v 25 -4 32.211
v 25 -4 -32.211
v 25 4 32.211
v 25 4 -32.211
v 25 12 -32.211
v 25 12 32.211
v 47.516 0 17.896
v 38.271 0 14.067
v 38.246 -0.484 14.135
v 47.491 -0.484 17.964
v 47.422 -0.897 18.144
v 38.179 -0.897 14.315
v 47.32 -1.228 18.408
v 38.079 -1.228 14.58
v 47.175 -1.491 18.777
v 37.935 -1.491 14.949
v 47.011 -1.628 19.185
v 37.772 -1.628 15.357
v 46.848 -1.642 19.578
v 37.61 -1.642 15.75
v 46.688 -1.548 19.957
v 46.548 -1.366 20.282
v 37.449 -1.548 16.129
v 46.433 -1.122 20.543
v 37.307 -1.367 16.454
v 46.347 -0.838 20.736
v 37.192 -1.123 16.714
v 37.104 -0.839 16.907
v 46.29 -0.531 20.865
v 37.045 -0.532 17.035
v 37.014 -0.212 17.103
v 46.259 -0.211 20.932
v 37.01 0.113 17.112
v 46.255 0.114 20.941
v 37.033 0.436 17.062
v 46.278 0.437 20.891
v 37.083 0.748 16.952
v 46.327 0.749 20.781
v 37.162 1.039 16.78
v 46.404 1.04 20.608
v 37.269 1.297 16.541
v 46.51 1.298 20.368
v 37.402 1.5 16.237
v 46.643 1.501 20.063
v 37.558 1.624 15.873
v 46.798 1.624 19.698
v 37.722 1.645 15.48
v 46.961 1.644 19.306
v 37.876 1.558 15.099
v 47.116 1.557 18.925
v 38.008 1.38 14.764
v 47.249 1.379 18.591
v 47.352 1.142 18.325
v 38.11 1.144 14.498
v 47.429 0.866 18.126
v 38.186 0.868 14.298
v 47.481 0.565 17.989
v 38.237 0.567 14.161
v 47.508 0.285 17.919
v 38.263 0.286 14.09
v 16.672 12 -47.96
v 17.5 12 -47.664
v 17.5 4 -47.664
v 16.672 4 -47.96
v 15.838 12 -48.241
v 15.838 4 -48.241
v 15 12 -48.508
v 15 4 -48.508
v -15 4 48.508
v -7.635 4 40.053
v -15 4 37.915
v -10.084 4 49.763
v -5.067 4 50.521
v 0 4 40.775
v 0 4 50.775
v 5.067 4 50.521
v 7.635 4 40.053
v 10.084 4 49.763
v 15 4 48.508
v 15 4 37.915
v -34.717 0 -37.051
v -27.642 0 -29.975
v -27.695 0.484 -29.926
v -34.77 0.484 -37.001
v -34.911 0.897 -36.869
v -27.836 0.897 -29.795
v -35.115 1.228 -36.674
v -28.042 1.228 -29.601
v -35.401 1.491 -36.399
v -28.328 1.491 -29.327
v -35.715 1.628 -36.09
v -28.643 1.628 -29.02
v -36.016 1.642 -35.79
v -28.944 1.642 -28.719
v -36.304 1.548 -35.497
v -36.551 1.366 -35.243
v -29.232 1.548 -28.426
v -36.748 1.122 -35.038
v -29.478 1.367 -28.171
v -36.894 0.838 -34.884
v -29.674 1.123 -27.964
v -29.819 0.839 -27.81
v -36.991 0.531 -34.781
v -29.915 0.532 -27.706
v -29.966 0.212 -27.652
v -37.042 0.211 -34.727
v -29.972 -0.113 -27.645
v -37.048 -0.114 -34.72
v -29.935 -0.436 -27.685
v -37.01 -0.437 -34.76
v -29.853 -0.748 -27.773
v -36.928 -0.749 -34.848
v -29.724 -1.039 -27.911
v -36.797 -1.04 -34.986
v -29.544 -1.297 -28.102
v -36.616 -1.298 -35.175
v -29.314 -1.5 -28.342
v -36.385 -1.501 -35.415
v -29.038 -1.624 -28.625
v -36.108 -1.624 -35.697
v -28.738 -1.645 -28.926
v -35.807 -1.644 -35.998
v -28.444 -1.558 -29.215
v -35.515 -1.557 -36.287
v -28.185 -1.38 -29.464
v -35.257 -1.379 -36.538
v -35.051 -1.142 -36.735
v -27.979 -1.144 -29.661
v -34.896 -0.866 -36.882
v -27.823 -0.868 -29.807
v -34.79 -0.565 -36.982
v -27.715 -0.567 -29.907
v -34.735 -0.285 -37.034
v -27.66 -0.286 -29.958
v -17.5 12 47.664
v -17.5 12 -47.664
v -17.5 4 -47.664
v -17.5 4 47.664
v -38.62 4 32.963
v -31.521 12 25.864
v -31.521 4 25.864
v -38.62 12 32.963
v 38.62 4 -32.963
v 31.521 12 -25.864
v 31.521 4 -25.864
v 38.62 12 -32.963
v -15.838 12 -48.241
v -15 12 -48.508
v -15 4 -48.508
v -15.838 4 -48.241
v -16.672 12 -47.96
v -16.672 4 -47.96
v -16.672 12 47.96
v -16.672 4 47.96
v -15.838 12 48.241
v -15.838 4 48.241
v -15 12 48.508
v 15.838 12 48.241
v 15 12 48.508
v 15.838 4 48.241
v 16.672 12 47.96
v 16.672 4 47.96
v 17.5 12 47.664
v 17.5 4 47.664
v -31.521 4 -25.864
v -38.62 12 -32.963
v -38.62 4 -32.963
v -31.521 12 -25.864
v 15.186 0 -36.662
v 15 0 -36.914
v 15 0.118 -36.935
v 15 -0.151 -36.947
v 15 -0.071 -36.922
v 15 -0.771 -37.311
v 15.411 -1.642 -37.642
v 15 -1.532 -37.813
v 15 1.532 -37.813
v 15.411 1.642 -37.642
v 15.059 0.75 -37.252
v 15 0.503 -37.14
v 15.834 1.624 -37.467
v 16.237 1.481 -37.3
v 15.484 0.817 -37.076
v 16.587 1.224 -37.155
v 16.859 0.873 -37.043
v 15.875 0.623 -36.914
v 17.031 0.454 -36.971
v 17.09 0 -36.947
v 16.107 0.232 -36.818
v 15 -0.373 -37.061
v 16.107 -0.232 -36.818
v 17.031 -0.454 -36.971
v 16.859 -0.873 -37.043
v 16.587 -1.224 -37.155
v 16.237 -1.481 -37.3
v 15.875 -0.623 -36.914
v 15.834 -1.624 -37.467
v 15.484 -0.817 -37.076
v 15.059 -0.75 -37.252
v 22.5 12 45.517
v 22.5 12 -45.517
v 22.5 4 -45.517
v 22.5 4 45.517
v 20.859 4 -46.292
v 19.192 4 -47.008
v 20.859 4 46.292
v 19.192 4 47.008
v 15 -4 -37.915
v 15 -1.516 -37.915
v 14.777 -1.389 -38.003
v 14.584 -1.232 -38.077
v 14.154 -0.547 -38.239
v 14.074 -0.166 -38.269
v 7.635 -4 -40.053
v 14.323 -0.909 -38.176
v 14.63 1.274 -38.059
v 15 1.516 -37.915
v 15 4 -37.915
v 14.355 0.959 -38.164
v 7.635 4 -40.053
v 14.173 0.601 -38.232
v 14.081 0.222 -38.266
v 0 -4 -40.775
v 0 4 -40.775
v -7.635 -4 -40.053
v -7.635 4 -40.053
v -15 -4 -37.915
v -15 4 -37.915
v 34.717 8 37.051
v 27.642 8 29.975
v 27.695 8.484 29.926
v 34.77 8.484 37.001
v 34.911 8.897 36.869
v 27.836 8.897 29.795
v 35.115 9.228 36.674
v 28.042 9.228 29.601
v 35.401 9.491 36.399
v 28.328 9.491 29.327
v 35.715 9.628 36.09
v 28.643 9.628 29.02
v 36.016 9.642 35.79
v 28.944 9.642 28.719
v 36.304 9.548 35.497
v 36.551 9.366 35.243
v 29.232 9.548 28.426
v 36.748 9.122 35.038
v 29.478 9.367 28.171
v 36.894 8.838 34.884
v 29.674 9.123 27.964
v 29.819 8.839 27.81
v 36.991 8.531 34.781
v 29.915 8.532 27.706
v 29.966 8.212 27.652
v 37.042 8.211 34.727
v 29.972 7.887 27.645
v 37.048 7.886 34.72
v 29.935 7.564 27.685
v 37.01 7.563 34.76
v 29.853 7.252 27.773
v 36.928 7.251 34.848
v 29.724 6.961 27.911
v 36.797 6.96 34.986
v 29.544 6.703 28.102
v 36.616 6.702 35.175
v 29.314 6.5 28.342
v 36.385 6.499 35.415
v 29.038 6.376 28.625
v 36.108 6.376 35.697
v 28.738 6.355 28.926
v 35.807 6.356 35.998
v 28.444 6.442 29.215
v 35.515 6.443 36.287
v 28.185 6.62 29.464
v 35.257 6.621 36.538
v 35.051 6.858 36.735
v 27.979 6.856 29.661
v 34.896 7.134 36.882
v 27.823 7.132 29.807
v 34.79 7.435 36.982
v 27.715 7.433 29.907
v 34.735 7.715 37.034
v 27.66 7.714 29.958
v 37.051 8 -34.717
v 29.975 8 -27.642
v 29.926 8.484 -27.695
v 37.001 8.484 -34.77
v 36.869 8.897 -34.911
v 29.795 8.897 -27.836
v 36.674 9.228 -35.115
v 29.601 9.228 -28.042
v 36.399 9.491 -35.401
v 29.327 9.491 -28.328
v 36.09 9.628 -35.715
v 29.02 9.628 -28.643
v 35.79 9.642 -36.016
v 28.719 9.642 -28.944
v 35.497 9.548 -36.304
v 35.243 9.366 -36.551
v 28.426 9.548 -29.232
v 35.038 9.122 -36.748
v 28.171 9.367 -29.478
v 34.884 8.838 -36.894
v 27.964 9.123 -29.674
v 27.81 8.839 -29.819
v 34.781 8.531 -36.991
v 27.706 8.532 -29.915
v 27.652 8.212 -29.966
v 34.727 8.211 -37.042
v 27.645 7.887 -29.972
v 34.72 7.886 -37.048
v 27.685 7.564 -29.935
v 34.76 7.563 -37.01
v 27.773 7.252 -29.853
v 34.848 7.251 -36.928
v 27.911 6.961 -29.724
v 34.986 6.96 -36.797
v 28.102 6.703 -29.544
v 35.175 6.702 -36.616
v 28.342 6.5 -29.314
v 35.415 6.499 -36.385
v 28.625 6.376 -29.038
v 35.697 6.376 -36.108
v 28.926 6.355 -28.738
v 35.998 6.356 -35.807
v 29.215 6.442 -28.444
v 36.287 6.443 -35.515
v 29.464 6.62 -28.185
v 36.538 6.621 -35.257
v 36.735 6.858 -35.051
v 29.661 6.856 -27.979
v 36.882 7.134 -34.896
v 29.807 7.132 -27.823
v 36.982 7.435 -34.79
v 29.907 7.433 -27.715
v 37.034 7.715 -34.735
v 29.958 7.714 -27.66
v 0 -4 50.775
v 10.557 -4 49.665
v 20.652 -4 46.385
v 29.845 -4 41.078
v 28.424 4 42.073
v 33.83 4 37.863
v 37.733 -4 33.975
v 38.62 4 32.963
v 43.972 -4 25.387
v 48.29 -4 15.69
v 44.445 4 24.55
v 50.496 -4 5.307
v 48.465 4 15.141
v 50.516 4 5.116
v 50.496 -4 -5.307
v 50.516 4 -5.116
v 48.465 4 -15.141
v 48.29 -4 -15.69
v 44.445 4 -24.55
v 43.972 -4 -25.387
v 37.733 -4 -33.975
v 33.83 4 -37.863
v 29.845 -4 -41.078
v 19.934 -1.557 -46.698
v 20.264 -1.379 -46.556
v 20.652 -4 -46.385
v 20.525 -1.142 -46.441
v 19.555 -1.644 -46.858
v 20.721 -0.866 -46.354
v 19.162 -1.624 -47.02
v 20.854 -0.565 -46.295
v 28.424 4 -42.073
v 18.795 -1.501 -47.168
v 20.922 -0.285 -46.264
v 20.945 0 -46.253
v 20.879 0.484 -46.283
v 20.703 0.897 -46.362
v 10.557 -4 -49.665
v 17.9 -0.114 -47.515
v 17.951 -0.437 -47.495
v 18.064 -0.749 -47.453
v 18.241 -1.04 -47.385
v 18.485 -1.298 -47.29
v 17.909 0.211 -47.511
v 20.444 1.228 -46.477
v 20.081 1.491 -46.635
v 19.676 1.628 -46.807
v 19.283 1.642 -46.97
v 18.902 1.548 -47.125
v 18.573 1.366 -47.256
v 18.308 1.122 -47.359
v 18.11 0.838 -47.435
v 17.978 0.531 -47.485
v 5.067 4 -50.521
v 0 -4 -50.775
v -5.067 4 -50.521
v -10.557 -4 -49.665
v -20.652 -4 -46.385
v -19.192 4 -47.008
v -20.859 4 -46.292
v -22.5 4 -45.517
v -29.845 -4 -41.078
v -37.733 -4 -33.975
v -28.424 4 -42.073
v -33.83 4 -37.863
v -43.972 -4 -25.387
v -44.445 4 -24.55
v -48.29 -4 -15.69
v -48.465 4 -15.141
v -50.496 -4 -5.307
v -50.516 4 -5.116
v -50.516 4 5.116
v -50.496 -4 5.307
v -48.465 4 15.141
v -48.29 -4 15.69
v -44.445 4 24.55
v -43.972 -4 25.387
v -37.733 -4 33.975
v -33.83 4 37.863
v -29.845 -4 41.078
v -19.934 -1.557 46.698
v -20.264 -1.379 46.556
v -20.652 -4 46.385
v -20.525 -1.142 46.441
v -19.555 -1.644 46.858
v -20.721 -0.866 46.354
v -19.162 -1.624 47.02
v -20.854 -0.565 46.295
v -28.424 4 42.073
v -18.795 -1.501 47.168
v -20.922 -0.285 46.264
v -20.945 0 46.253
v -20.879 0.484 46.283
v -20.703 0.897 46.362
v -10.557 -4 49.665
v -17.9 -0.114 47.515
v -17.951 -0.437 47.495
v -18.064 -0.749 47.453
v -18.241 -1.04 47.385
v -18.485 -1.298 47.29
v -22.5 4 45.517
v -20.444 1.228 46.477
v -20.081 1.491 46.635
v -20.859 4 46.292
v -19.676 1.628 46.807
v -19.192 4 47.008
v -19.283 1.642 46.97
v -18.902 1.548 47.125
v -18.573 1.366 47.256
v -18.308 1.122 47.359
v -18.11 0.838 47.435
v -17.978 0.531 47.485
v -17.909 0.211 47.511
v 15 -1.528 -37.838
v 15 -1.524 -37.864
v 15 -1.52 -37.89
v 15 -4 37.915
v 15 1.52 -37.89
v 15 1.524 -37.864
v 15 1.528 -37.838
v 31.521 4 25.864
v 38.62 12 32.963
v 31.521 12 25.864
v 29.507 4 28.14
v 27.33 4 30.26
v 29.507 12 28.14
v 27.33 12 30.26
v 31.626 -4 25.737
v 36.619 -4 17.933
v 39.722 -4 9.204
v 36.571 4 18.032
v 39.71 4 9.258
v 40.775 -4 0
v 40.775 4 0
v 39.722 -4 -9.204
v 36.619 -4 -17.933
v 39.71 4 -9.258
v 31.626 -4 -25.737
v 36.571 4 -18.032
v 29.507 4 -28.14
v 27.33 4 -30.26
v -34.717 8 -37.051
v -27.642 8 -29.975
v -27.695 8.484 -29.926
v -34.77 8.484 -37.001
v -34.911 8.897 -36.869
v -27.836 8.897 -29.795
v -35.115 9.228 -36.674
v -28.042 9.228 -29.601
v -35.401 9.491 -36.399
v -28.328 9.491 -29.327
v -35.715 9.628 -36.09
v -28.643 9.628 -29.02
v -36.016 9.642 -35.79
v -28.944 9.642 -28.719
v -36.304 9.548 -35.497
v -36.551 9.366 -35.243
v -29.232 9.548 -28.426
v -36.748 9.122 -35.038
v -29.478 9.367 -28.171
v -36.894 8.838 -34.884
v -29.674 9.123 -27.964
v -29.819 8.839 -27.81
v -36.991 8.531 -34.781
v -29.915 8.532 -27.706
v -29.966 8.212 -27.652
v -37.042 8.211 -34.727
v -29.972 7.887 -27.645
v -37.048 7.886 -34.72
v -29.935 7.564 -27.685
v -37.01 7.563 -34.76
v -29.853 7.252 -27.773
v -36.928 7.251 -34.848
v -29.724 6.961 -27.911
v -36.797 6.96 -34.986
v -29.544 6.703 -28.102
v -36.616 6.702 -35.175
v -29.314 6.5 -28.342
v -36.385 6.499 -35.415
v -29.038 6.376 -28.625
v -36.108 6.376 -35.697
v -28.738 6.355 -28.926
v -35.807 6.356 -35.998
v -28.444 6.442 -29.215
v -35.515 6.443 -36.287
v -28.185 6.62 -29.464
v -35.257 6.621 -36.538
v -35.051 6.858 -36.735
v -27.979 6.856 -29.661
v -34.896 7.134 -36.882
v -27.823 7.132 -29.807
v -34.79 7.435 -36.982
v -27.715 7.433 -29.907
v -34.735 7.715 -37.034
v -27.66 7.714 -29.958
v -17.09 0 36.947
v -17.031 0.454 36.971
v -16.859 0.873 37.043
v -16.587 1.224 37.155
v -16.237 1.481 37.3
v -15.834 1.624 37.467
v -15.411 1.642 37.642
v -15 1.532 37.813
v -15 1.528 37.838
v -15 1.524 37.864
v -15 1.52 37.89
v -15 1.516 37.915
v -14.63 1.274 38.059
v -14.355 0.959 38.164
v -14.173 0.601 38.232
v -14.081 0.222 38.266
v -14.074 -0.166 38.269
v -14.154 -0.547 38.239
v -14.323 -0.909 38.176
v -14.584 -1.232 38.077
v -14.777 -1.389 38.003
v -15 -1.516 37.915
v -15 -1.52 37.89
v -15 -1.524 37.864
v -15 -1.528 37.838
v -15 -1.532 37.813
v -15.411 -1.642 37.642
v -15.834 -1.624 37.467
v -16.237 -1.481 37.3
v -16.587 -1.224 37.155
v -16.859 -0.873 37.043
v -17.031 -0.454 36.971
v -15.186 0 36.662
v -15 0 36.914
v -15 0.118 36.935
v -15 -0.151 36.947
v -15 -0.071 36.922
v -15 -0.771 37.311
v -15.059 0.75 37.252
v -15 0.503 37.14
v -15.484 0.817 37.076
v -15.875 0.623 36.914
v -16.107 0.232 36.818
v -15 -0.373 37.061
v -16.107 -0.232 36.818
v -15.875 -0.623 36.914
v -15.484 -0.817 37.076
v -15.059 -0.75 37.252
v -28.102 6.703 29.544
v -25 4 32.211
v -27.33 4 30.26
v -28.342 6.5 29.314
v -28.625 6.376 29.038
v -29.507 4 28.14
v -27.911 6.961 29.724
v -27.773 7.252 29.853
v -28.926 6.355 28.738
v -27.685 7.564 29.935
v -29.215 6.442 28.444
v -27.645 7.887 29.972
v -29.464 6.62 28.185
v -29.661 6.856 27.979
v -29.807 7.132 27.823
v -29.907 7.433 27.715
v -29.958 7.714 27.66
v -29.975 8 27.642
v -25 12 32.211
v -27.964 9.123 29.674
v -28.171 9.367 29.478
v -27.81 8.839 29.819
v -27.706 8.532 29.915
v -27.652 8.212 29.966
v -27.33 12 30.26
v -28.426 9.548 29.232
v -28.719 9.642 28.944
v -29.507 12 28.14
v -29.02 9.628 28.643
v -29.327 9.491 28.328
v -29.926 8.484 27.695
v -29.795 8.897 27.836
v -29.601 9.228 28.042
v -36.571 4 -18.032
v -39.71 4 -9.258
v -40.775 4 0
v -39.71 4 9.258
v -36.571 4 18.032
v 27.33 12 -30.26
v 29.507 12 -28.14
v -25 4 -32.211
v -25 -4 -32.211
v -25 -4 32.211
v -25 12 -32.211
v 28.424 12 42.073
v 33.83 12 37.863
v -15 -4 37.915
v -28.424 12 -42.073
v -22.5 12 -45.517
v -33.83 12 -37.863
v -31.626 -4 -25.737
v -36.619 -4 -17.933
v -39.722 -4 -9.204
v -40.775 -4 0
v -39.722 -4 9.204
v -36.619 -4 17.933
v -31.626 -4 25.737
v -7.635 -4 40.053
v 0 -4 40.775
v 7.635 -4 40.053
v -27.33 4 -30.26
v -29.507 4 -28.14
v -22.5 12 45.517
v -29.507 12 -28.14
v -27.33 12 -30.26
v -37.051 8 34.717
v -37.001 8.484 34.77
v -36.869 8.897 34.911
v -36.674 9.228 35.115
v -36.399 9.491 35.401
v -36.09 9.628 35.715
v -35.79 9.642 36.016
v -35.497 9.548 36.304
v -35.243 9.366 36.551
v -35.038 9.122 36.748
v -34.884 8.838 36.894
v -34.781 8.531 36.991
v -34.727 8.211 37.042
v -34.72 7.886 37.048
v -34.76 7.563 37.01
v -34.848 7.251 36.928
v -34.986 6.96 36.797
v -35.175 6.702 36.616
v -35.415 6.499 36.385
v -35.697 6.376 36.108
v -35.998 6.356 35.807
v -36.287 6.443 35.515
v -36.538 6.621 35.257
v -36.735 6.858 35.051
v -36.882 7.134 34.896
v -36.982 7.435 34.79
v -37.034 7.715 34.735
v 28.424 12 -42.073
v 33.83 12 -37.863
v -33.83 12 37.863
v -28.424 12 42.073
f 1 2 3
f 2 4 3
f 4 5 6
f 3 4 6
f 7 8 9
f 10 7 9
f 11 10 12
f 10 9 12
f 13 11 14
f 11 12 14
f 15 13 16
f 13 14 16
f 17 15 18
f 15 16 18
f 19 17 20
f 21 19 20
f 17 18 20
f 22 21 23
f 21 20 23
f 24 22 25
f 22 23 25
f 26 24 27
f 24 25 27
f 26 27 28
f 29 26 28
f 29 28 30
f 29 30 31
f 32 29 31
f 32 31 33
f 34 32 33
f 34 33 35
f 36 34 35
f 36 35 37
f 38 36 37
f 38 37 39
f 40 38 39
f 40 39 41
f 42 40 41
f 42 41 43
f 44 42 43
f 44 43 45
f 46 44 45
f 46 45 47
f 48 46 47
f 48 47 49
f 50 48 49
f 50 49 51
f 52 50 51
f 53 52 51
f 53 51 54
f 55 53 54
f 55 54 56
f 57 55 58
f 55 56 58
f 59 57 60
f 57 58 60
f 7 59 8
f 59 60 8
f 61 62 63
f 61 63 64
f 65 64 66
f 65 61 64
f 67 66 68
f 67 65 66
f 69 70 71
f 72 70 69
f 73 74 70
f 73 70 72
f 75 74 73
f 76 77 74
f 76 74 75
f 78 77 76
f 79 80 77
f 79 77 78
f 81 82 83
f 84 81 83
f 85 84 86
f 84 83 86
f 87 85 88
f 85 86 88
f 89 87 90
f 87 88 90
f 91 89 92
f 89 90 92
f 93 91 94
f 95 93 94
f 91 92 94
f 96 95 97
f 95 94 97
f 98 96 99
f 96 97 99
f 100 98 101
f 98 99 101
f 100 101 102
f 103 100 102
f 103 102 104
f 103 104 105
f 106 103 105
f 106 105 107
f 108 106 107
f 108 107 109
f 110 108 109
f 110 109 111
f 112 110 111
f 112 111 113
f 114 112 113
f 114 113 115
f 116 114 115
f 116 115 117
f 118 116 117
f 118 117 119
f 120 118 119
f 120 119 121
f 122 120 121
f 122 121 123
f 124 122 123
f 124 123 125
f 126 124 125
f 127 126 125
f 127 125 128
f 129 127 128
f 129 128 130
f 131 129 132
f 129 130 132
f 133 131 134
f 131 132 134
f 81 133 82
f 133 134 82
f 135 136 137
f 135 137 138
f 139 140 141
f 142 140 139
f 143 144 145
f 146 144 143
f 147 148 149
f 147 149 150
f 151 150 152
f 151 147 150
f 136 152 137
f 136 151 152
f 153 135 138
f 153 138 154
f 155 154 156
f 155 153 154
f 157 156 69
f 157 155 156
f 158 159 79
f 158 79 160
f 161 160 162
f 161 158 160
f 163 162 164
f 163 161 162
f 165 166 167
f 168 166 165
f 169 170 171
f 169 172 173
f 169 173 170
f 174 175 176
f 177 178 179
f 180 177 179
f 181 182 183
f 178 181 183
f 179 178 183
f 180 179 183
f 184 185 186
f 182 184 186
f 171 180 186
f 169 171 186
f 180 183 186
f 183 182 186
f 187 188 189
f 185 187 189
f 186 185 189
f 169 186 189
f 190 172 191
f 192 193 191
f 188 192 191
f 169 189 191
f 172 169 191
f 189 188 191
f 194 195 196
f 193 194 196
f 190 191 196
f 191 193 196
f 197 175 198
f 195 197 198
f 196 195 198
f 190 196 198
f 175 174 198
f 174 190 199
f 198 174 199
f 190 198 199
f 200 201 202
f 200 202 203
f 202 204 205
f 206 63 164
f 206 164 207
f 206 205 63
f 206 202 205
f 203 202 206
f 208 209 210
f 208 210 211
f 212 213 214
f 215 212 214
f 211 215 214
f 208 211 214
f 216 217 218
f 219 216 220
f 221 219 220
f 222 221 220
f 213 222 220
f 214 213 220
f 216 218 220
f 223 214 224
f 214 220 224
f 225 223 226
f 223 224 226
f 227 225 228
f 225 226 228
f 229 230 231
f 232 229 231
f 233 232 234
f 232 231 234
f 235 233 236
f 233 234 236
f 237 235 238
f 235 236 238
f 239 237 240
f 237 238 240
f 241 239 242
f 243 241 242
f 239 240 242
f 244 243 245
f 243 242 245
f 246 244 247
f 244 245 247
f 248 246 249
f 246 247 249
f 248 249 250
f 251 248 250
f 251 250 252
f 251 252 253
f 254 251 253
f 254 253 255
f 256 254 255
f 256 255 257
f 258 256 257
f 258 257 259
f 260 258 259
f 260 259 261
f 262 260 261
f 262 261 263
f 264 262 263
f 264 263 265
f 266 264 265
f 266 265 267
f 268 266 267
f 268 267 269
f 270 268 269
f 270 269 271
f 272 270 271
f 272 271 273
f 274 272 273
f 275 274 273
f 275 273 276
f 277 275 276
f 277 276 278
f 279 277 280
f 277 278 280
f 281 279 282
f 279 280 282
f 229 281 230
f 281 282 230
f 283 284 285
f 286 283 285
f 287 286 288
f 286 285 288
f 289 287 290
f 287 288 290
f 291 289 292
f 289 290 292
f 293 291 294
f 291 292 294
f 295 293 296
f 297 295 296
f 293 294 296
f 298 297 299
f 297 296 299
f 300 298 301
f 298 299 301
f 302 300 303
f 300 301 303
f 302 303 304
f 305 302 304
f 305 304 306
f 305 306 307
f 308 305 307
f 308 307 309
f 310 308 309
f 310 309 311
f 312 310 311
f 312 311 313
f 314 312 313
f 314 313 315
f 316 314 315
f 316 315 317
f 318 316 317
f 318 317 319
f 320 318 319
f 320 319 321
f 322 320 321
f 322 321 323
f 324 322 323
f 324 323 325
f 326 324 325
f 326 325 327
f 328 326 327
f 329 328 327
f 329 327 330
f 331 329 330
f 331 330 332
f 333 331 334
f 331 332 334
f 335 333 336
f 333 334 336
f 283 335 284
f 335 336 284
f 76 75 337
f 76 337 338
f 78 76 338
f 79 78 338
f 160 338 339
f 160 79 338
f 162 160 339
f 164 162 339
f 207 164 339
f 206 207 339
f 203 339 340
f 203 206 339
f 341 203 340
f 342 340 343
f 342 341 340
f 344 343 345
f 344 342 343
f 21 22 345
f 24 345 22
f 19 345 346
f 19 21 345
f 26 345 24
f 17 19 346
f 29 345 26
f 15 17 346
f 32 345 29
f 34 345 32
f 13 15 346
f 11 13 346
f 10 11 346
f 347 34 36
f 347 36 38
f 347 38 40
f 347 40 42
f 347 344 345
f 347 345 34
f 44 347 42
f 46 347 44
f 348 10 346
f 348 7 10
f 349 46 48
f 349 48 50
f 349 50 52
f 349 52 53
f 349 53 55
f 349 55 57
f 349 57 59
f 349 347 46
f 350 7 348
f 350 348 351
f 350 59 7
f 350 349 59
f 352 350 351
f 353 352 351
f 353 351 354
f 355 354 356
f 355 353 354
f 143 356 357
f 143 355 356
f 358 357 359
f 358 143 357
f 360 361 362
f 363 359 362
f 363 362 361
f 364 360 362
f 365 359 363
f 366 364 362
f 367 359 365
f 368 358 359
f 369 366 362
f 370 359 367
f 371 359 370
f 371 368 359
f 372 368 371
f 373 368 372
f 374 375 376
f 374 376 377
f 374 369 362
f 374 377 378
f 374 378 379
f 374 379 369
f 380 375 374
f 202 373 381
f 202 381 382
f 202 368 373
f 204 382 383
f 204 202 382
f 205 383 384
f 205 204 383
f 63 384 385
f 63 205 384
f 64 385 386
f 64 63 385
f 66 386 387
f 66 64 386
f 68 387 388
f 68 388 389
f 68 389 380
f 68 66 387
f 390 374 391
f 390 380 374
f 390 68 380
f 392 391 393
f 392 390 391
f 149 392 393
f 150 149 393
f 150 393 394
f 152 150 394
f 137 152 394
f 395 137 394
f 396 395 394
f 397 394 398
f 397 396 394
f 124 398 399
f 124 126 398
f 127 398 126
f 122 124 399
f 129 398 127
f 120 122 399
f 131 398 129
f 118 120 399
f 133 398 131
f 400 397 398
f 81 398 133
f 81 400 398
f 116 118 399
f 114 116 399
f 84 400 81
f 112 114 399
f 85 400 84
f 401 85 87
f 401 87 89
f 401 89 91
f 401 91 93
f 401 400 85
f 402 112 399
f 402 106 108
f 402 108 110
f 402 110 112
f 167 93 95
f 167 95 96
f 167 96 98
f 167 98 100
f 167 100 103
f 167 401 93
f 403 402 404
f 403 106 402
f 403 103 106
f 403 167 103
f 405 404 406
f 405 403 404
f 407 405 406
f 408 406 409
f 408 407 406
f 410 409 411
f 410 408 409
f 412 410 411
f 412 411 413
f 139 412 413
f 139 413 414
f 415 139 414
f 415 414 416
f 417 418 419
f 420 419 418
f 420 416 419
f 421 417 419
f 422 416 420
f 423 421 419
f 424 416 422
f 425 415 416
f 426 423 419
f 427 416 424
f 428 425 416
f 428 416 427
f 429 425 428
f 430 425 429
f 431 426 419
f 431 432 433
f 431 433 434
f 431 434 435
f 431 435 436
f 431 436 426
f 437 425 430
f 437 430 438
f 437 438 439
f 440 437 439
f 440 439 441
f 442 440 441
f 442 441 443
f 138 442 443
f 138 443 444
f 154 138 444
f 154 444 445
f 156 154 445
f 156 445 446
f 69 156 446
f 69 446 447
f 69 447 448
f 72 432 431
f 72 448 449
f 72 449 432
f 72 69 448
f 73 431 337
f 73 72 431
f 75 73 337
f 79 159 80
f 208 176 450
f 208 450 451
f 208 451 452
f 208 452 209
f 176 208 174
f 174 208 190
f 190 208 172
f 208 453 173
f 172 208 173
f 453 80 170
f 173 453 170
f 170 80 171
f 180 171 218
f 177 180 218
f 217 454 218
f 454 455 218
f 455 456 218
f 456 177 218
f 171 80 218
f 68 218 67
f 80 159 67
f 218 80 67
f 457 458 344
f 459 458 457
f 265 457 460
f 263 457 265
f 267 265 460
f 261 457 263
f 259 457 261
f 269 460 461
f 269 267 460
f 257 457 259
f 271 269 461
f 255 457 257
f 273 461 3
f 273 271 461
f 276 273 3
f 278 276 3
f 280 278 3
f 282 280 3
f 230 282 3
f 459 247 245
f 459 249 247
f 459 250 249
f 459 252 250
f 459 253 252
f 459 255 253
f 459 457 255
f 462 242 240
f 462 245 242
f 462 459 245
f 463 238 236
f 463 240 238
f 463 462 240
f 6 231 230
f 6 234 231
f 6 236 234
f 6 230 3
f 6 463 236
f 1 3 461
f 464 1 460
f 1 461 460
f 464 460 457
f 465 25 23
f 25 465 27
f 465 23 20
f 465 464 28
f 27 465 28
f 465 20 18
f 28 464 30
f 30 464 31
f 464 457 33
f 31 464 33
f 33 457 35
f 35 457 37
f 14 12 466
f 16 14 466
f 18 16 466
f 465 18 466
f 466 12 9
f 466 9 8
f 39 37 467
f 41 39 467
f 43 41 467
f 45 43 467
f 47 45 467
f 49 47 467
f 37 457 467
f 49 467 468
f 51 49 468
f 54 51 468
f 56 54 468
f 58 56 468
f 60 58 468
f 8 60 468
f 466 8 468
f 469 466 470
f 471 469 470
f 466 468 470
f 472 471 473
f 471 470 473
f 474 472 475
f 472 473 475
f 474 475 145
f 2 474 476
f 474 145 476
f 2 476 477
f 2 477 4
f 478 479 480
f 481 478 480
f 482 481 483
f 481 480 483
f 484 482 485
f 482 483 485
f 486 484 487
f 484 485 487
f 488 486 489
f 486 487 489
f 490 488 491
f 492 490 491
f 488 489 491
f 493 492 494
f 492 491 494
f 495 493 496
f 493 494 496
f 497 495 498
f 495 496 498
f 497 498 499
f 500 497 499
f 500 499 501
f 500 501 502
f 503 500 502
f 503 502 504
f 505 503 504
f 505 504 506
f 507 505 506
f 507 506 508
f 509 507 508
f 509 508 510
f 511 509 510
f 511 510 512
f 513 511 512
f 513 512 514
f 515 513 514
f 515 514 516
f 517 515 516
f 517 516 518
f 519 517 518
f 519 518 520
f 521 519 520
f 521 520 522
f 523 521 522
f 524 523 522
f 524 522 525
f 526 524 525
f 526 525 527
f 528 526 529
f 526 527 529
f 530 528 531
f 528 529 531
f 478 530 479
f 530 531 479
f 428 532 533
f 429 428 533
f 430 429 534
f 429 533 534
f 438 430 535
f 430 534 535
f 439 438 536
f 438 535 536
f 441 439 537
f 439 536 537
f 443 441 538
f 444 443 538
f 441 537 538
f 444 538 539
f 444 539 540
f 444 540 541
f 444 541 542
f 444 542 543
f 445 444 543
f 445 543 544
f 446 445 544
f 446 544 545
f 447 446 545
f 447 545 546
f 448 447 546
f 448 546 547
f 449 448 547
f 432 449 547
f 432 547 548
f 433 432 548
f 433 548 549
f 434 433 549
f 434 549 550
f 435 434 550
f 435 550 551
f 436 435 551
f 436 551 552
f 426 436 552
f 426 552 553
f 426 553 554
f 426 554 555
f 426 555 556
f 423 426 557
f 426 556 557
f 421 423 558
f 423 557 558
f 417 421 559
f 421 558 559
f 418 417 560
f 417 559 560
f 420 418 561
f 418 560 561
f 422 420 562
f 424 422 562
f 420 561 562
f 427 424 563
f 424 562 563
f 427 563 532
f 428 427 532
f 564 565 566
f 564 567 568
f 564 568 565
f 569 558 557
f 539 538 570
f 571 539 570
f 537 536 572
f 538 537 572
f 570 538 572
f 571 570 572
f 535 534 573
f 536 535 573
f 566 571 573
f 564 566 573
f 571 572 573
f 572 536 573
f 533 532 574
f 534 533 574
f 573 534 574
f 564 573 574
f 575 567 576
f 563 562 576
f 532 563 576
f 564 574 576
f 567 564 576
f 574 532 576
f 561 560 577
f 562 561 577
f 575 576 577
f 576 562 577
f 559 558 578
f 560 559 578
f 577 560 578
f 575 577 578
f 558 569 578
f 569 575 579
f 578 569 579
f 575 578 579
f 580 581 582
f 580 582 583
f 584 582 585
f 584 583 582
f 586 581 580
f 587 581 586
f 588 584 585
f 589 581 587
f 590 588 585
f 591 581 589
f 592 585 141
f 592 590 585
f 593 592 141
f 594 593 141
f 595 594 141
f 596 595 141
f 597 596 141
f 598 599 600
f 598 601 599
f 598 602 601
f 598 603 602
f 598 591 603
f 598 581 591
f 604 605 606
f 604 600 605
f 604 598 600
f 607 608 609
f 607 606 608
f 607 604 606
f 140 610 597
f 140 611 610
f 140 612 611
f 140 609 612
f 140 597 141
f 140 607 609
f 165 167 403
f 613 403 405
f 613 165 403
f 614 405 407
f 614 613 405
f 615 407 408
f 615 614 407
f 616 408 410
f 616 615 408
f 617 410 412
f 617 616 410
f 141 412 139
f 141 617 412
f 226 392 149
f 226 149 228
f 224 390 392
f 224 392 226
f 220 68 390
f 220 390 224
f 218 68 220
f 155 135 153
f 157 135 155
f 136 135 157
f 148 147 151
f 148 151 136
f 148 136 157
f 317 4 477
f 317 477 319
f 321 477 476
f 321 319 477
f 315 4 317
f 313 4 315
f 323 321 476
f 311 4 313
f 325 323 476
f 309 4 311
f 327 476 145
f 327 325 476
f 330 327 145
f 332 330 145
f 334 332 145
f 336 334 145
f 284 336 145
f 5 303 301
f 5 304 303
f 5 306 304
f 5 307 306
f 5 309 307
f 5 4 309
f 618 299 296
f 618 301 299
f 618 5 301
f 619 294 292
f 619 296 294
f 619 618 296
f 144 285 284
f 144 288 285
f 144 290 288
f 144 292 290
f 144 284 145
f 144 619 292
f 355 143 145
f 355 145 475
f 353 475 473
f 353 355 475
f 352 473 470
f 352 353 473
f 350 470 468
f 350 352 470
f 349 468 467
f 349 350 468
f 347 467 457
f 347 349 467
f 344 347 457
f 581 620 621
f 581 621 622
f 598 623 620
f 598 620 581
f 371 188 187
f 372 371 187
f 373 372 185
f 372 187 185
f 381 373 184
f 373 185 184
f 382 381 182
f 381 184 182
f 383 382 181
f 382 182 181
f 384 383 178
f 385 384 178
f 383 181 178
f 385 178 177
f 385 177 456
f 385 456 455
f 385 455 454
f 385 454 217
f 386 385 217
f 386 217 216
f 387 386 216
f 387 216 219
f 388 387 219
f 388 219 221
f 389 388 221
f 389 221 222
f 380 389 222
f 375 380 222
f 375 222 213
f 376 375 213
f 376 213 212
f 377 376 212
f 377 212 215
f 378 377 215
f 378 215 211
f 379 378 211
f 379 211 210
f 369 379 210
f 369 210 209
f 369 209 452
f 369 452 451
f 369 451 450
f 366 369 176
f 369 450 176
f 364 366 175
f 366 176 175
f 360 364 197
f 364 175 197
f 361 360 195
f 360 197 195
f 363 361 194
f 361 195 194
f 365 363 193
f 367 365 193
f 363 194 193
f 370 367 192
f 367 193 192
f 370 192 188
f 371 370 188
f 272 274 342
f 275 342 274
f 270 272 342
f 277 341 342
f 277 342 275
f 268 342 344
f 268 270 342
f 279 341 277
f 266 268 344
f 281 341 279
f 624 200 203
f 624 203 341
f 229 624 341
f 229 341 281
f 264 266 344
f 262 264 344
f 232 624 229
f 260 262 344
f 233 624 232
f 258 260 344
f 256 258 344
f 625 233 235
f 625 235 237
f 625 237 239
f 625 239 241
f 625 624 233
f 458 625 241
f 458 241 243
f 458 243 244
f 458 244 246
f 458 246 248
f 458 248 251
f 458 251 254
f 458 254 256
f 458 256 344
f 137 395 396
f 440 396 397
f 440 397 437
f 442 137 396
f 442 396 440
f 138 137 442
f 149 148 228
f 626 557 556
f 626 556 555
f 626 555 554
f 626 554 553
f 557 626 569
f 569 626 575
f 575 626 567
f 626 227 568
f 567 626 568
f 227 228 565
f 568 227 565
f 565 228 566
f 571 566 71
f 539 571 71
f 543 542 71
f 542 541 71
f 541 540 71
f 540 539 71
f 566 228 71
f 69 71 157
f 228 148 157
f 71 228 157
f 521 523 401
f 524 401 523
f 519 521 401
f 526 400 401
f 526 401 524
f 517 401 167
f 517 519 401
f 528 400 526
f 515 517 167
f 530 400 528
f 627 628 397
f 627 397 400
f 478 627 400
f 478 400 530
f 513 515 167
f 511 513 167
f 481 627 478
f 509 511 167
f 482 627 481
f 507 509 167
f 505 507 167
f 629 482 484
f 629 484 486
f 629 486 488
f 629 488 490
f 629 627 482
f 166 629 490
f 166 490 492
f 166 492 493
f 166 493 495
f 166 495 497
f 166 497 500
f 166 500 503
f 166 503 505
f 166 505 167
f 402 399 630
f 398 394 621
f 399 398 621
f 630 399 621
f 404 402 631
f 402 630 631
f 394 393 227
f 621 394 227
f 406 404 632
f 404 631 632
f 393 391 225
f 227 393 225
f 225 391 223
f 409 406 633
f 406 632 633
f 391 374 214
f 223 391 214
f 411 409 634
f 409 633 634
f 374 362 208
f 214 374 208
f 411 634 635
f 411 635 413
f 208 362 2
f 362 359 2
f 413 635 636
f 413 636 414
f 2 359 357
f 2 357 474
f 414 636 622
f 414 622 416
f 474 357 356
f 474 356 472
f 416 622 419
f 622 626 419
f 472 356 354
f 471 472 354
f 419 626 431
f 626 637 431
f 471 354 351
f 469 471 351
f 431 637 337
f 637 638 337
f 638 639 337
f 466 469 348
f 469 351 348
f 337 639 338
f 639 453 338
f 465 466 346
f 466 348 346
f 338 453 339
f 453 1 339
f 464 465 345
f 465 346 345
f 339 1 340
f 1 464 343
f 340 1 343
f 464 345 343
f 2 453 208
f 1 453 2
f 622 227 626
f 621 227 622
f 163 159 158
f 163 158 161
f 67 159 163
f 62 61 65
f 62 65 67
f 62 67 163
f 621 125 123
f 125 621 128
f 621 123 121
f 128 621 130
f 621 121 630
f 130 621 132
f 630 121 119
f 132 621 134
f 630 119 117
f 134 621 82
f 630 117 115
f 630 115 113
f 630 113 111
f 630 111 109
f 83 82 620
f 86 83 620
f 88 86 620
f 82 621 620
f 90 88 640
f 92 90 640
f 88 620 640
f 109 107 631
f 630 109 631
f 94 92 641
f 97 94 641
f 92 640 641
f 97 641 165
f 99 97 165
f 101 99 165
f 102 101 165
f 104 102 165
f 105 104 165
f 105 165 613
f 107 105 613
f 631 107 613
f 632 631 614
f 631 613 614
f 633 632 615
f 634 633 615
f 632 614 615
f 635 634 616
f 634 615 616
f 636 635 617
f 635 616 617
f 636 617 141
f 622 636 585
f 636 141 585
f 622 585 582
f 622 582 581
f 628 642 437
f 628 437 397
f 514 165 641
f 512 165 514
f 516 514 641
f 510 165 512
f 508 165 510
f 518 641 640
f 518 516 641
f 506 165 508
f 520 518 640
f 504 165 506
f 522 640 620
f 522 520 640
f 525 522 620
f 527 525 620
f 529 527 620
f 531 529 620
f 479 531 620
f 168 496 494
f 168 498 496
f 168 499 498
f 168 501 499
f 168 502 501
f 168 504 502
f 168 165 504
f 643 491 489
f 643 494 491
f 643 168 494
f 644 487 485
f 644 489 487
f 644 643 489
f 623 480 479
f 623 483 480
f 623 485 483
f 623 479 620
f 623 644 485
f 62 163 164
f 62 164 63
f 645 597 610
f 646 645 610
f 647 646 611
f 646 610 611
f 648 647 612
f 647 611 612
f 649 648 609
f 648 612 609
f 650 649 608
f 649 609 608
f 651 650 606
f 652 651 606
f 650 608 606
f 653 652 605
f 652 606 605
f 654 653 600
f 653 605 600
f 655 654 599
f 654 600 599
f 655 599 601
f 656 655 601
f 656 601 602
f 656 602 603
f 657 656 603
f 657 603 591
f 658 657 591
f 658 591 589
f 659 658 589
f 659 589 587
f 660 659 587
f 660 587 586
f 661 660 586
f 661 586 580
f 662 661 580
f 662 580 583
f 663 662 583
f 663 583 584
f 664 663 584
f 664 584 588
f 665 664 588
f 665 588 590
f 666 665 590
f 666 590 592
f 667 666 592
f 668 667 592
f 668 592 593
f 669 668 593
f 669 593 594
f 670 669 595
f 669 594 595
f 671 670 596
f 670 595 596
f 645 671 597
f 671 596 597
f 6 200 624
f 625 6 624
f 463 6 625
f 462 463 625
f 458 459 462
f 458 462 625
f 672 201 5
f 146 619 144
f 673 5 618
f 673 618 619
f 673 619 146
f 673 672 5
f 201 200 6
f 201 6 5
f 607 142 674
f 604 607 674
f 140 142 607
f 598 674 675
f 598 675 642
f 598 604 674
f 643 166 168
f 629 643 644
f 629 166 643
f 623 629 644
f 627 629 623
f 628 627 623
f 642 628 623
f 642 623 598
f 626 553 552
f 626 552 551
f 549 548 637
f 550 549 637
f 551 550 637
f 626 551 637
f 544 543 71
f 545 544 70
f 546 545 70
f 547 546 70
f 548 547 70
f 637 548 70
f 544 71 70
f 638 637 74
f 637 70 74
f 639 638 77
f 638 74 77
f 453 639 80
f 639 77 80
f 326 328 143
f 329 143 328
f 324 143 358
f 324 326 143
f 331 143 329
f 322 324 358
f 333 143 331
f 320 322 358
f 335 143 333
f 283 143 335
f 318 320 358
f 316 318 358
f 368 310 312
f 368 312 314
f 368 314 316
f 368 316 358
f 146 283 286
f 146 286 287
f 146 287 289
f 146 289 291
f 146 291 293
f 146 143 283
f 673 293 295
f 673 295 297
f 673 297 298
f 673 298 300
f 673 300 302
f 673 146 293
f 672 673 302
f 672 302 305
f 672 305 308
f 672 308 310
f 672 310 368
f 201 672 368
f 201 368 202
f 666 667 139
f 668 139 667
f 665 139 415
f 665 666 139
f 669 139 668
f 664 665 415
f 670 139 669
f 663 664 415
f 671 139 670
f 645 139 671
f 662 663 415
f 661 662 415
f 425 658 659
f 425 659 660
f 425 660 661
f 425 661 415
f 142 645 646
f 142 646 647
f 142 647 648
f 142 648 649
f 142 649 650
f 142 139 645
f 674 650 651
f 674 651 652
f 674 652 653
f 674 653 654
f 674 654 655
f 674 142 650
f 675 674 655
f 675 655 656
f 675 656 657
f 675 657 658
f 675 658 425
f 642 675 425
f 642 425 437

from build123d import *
from build123d.topology import SkipClean

# Parameters (mm, degrees)
SKETCH1_R                       = 50.7746
BOSS_EXTRUDE1_DEPTH             = 4
BOSS_EXTRUDE2_START             = 8
BOSS_EXTRUDE2_DEPTH             = 8
M4_TAPPED_HOLE1_D               = 3.3
M4_TAPPED_HOLE1_DEPTH           = 10.1
M4_TAPPED_HOLE1_TIP             = 0.991420021
M4_TAPPED_HOLE1_ON_FACE_2_D     = 3.3
M4_TAPPED_HOLE1_ON_FACE_2_DEPTH = 10.1
M4_TAPPED_HOLE1_ON_FACE_2_TIP   = 0.991420021
M4_TAPPED_HOLE1_ON_FACE_3_D     = 3.3
M4_TAPPED_HOLE1_ON_FACE_3_DEPTH = 10.1
M4_TAPPED_HOLE1_ON_FACE_3_TIP   = 0.991420021
M4_TAPPED_HOLE1_ON_FACE_4_D     = 3.3
M4_TAPPED_HOLE1_ON_FACE_4_DEPTH = 10.1
M4_TAPPED_HOLE1_ON_FACE_4_TIP   = 0.991420021
M4_TAPPED_HOLE1_ON_FACE_5_D     = 3.3
M4_TAPPED_HOLE1_ON_FACE_5_DEPTH = 10.1
M4_TAPPED_HOLE1_ON_FACE_5_TIP   = 0.991420021
M4_TAPPED_HOLE1_ON_FACE_6_D     = 3.3
M4_TAPPED_HOLE1_ON_FACE_6_DEPTH = 10.1
M4_TAPPED_HOLE1_ON_FACE_6_TIP   = 0.991420021
M4_TAPPED_HOLE1_ON_FACE_7_D     = 3.3
M4_TAPPED_HOLE1_ON_FACE_7_DEPTH = 10.1
M4_TAPPED_HOLE1_ON_FACE_7_TIP   = 0.991420021
M4_TAPPED_HOLE1_ON_FACE_8_D     = 3.3
M4_TAPPED_HOLE1_ON_FACE_8_DEPTH = 10.1
M4_TAPPED_HOLE1_ON_FACE_8_TIP   = 0.991420021


with BuildPart() as part:
    # Sketch1 → Boss-Extrude1 (new, symmetric)
    with BuildSketch(Plane(origin=(0, 0, 0), x_dir=(1, 0, 0), z_dir=(0, 1, 0))):
        with Locations(Location((0, 0, 0), (0, 0, 270))):
            Circle(SKETCH1_R)
        with BuildLine():
            ThreePointArc((15, 37.915274035), (0, 40.7746), (-15, 37.915274035))
            Line((-15, 37.915274035), (-15, -37.915274035))
            ThreePointArc((-15, -37.915274035), (0, -40.7746), (15, -37.915274035))
            Line((15, -37.915274035), (15, 37.915274035))
        make_face(mode=Mode.SUBTRACT)
        with BuildLine():
            ThreePointArc((25, -32.211302444), (40.7746, 0), (25, 32.211302444))
            Line((25, 32.211302444), (25, -32.211302444))
        make_face(mode=Mode.SUBTRACT)
        with BuildLine():
            ThreePointArc((-25, 32.211302444), (-40.7746, 0), (-25, -32.211302444))
            Line((-25, -32.211302444), (-25, 32.211302444))
        make_face(mode=Mode.SUBTRACT)
    extrude(amount=BOSS_EXTRUDE1_DEPTH, both=True)

    # Sketch2 → Boss-Extrude2 (add)
    with SkipClean():  # the faces are left unmerged after this step: merging them gives an invalid solid
        with BuildSketch(Plane(origin=(0, 4, 0), x_dir=(1, 0, 0), z_dir=(0, 1, 0)).offset(BOSS_EXTRUDE2_START)):
            with BuildLine():
                Line((-22.5, -45.517139686), (-22.5, 45.517139686))
                ThreePointArc((-22.5, 45.517139686), (-31.197949015, 40.059305815), (-38.619906594, 32.963052344))
                Line((-38.619906594, 32.963052344), (-31.521353127, 25.864498878))
                ThreePointArc((-31.521353127, 25.864498878), (-28.438289659, 29.220398465), (-25, 32.211302444))
                Line((-25, 32.211302444), (-25, -32.211302444))
                ThreePointArc((-25, -32.211302444), (-28.438289659, -29.220398465), (-31.521353127, -25.864498878))
                Line((-31.521353127, -25.864498878), (-38.619906594, -32.963052344))
                ThreePointArc((-38.619906594, -32.963052344), (-31.197949015, -40.059305815), (-22.5, -45.517139686))
            make_face()
            with BuildLine():
                ThreePointArc((-15, 48.50834985), (-16.255489516, 48.102173192), (-17.5, 47.663508108))
                Line((-17.5, 47.663508108), (-17.5, -47.663508108))
                ThreePointArc((-17.5, -47.663508108), (-16.255489516, -48.102173192), (-15, -48.50834985))
                Line((-15, -48.50834985), (-15, 48.50834985))
            make_face()
            with BuildLine():
                ThreePointArc((17.5, 47.663508108), (16.255489516, 48.102173192), (15, 48.50834985))
                Line((15, 48.50834985), (15, -48.50834985))
                ThreePointArc((15, -48.50834985), (16.255489516, -48.102173192), (17.5, -47.663508108))
                Line((17.5, -47.663508108), (17.5, 47.663508108))
            make_face()
            with BuildLine():
                ThreePointArc((38.619906594, 32.963052344), (31.197949015, 40.059305815), (22.5, 45.517139686))
                Line((22.5, 45.517139686), (22.5, -45.517139686))
                ThreePointArc((22.5, -45.517139686), (31.197949015, -40.059305815), (38.619906594, -32.963052344))
                Line((38.619906594, -32.963052344), (31.521353127, -25.864498878))
                ThreePointArc((31.521353127, -25.864498878), (28.438289659, -29.220398465), (25, -32.211302444))
                Line((25, -32.211302444), (25, 32.211302444))
                ThreePointArc((25, 32.211302444), (28.438289659, 29.220398465), (31.521353127, 25.864498878))
                Line((31.521353127, 25.864498878), (38.619906594, 32.963052344))
            make_face()
        extrude(amount=-BOSS_EXTRUDE2_DEPTH)

    # M4 Tapped Hole1
    with Locations(Plane(origin=(-19.430598205, 0, 46.909613711), x_dir=(0.923879532511, 0, 0.382683432365), z_dir=(-0.382683432365, 0, 0.923879532511))):
        with Locations((0, 0)):
            Hole(M4_TAPPED_HOLE1_D / 2, depth=M4_TAPPED_HOLE1_DEPTH)
            with Locations((0, 0, -(M4_TAPPED_HOLE1_DEPTH + M4_TAPPED_HOLE1_TIP / 2))):  # 118° drill point
                Cone(0, M4_TAPPED_HOLE1_D / 2, M4_TAPPED_HOLE1_TIP, mode=Mode.SUBTRACT)

    # M4 Tapped Hole1 on face 2
    with Locations(Plane(origin=(46.909613711, 0, 19.430598205), x_dir=(-0.382682898036, 0, 0.923879753837), z_dir=(0.923879753837, 0, 0.382682898036))):
        with Locations((0, 0)):
            Hole(M4_TAPPED_HOLE1_ON_FACE_2_D / 2, depth=M4_TAPPED_HOLE1_ON_FACE_2_DEPTH)
            with Locations((0, 0, -(M4_TAPPED_HOLE1_ON_FACE_2_DEPTH + M4_TAPPED_HOLE1_ON_FACE_2_TIP / 2))):  # 118° drill point
                Cone(0, M4_TAPPED_HOLE1_ON_FACE_2_D / 2, M4_TAPPED_HOLE1_ON_FACE_2_TIP, mode=Mode.SUBTRACT)

    # M4 Tapped Hole1 on face 3
    with Locations(Plane(origin=(-35.903063972, 0, -35.903063972), x_dir=(-0.707106781187, 0, 0.707106781187), z_dir=(-0.707106781187, 0, -0.707106781187))):
        with Locations((0, 0), (0, 8)):
            Hole(M4_TAPPED_HOLE1_ON_FACE_3_D / 2, depth=M4_TAPPED_HOLE1_ON_FACE_3_DEPTH)
            with Locations((0, 0, -(M4_TAPPED_HOLE1_ON_FACE_3_DEPTH + M4_TAPPED_HOLE1_ON_FACE_3_TIP / 2))):  # 118° drill point
                Cone(0, M4_TAPPED_HOLE1_ON_FACE_3_D / 2, M4_TAPPED_HOLE1_ON_FACE_3_TIP, mode=Mode.SUBTRACT)

    # M4 Tapped Hole1 on face 4
    with Locations(Plane(origin=(19.430598205, 0, -46.909613711), x_dir=(-0.923879753837, 0, -0.382682898036), z_dir=(0.382682898036, 0, -0.923879753837))):
        with Locations((0, 0)):
            Hole(M4_TAPPED_HOLE1_ON_FACE_4_D / 2, depth=M4_TAPPED_HOLE1_ON_FACE_4_DEPTH)
            with Locations((0, 0, -(M4_TAPPED_HOLE1_ON_FACE_4_DEPTH + M4_TAPPED_HOLE1_ON_FACE_4_TIP / 2))):  # 118° drill point
                Cone(0, M4_TAPPED_HOLE1_ON_FACE_4_D / 2, M4_TAPPED_HOLE1_ON_FACE_4_TIP, mode=Mode.SUBTRACT)

    # M4 Tapped Hole1 on face 5
    with Locations(Plane(origin=(0, 8, 0), x_dir=(0.923879532511, 0, 0.382683432365), z_dir=(-0.382683432365, 0, 0.923879532511))):
        with Locations((0, 0)):
            Hole(M4_TAPPED_HOLE1_ON_FACE_5_D / 2, depth=M4_TAPPED_HOLE1_ON_FACE_5_DEPTH)
            with Locations((0, 0, -(M4_TAPPED_HOLE1_ON_FACE_5_DEPTH + M4_TAPPED_HOLE1_ON_FACE_5_TIP / 2))):  # 118° drill point
                Cone(0, M4_TAPPED_HOLE1_ON_FACE_5_D / 2, M4_TAPPED_HOLE1_ON_FACE_5_TIP, mode=Mode.SUBTRACT)

    # M4 Tapped Hole1 on face 6
    with Locations(Plane(origin=(35.903063972, 8, 35.903063972), x_dir=(0.707106781187, 0, -0.707106781187), z_dir=(0.707106781187, 0, 0.707106781187))):
        with Locations((0, 0)):
            Hole(M4_TAPPED_HOLE1_ON_FACE_6_D / 2, depth=M4_TAPPED_HOLE1_ON_FACE_6_DEPTH)
            with Locations((0, 0, -(M4_TAPPED_HOLE1_ON_FACE_6_DEPTH + M4_TAPPED_HOLE1_ON_FACE_6_TIP / 2))):  # 118° drill point
                Cone(0, M4_TAPPED_HOLE1_ON_FACE_6_D / 2, M4_TAPPED_HOLE1_ON_FACE_6_TIP, mode=Mode.SUBTRACT)

    # M4 Tapped Hole1 on face 7
    with Locations(Plane(origin=(35.903063972, 8, -35.903063972), x_dir=(-0.707106781187, 0, -0.707106781187), z_dir=(0.707106781187, 0, -0.707106781187))):
        with Locations((0, 0)):
            Hole(M4_TAPPED_HOLE1_ON_FACE_7_D / 2, depth=M4_TAPPED_HOLE1_ON_FACE_7_DEPTH)
            with Locations((0, 0, -(M4_TAPPED_HOLE1_ON_FACE_7_DEPTH + M4_TAPPED_HOLE1_ON_FACE_7_TIP / 2))):  # 118° drill point
                Cone(0, M4_TAPPED_HOLE1_ON_FACE_7_D / 2, M4_TAPPED_HOLE1_ON_FACE_7_TIP, mode=Mode.SUBTRACT)

    # M4 Tapped Hole1 on face 8
    with Locations(Plane(origin=(-35.903063972, 8, 35.903063972), x_dir=(0.707106781187, 0, 0.707106781187), z_dir=(-0.707106781187, 0, 0.707106781187))):
        with Locations((0, 0)):
            Hole(M4_TAPPED_HOLE1_ON_FACE_8_D / 2, depth=M4_TAPPED_HOLE1_ON_FACE_8_DEPTH)
            with Locations((0, 0, -(M4_TAPPED_HOLE1_ON_FACE_8_DEPTH + M4_TAPPED_HOLE1_ON_FACE_8_TIP / 2))):  # 118° drill point
                Cone(0, M4_TAPPED_HOLE1_ON_FACE_8_D / 2, M4_TAPPED_HOLE1_ON_FACE_8_TIP, mode=Mode.SUBTRACT)


solid = part.part
